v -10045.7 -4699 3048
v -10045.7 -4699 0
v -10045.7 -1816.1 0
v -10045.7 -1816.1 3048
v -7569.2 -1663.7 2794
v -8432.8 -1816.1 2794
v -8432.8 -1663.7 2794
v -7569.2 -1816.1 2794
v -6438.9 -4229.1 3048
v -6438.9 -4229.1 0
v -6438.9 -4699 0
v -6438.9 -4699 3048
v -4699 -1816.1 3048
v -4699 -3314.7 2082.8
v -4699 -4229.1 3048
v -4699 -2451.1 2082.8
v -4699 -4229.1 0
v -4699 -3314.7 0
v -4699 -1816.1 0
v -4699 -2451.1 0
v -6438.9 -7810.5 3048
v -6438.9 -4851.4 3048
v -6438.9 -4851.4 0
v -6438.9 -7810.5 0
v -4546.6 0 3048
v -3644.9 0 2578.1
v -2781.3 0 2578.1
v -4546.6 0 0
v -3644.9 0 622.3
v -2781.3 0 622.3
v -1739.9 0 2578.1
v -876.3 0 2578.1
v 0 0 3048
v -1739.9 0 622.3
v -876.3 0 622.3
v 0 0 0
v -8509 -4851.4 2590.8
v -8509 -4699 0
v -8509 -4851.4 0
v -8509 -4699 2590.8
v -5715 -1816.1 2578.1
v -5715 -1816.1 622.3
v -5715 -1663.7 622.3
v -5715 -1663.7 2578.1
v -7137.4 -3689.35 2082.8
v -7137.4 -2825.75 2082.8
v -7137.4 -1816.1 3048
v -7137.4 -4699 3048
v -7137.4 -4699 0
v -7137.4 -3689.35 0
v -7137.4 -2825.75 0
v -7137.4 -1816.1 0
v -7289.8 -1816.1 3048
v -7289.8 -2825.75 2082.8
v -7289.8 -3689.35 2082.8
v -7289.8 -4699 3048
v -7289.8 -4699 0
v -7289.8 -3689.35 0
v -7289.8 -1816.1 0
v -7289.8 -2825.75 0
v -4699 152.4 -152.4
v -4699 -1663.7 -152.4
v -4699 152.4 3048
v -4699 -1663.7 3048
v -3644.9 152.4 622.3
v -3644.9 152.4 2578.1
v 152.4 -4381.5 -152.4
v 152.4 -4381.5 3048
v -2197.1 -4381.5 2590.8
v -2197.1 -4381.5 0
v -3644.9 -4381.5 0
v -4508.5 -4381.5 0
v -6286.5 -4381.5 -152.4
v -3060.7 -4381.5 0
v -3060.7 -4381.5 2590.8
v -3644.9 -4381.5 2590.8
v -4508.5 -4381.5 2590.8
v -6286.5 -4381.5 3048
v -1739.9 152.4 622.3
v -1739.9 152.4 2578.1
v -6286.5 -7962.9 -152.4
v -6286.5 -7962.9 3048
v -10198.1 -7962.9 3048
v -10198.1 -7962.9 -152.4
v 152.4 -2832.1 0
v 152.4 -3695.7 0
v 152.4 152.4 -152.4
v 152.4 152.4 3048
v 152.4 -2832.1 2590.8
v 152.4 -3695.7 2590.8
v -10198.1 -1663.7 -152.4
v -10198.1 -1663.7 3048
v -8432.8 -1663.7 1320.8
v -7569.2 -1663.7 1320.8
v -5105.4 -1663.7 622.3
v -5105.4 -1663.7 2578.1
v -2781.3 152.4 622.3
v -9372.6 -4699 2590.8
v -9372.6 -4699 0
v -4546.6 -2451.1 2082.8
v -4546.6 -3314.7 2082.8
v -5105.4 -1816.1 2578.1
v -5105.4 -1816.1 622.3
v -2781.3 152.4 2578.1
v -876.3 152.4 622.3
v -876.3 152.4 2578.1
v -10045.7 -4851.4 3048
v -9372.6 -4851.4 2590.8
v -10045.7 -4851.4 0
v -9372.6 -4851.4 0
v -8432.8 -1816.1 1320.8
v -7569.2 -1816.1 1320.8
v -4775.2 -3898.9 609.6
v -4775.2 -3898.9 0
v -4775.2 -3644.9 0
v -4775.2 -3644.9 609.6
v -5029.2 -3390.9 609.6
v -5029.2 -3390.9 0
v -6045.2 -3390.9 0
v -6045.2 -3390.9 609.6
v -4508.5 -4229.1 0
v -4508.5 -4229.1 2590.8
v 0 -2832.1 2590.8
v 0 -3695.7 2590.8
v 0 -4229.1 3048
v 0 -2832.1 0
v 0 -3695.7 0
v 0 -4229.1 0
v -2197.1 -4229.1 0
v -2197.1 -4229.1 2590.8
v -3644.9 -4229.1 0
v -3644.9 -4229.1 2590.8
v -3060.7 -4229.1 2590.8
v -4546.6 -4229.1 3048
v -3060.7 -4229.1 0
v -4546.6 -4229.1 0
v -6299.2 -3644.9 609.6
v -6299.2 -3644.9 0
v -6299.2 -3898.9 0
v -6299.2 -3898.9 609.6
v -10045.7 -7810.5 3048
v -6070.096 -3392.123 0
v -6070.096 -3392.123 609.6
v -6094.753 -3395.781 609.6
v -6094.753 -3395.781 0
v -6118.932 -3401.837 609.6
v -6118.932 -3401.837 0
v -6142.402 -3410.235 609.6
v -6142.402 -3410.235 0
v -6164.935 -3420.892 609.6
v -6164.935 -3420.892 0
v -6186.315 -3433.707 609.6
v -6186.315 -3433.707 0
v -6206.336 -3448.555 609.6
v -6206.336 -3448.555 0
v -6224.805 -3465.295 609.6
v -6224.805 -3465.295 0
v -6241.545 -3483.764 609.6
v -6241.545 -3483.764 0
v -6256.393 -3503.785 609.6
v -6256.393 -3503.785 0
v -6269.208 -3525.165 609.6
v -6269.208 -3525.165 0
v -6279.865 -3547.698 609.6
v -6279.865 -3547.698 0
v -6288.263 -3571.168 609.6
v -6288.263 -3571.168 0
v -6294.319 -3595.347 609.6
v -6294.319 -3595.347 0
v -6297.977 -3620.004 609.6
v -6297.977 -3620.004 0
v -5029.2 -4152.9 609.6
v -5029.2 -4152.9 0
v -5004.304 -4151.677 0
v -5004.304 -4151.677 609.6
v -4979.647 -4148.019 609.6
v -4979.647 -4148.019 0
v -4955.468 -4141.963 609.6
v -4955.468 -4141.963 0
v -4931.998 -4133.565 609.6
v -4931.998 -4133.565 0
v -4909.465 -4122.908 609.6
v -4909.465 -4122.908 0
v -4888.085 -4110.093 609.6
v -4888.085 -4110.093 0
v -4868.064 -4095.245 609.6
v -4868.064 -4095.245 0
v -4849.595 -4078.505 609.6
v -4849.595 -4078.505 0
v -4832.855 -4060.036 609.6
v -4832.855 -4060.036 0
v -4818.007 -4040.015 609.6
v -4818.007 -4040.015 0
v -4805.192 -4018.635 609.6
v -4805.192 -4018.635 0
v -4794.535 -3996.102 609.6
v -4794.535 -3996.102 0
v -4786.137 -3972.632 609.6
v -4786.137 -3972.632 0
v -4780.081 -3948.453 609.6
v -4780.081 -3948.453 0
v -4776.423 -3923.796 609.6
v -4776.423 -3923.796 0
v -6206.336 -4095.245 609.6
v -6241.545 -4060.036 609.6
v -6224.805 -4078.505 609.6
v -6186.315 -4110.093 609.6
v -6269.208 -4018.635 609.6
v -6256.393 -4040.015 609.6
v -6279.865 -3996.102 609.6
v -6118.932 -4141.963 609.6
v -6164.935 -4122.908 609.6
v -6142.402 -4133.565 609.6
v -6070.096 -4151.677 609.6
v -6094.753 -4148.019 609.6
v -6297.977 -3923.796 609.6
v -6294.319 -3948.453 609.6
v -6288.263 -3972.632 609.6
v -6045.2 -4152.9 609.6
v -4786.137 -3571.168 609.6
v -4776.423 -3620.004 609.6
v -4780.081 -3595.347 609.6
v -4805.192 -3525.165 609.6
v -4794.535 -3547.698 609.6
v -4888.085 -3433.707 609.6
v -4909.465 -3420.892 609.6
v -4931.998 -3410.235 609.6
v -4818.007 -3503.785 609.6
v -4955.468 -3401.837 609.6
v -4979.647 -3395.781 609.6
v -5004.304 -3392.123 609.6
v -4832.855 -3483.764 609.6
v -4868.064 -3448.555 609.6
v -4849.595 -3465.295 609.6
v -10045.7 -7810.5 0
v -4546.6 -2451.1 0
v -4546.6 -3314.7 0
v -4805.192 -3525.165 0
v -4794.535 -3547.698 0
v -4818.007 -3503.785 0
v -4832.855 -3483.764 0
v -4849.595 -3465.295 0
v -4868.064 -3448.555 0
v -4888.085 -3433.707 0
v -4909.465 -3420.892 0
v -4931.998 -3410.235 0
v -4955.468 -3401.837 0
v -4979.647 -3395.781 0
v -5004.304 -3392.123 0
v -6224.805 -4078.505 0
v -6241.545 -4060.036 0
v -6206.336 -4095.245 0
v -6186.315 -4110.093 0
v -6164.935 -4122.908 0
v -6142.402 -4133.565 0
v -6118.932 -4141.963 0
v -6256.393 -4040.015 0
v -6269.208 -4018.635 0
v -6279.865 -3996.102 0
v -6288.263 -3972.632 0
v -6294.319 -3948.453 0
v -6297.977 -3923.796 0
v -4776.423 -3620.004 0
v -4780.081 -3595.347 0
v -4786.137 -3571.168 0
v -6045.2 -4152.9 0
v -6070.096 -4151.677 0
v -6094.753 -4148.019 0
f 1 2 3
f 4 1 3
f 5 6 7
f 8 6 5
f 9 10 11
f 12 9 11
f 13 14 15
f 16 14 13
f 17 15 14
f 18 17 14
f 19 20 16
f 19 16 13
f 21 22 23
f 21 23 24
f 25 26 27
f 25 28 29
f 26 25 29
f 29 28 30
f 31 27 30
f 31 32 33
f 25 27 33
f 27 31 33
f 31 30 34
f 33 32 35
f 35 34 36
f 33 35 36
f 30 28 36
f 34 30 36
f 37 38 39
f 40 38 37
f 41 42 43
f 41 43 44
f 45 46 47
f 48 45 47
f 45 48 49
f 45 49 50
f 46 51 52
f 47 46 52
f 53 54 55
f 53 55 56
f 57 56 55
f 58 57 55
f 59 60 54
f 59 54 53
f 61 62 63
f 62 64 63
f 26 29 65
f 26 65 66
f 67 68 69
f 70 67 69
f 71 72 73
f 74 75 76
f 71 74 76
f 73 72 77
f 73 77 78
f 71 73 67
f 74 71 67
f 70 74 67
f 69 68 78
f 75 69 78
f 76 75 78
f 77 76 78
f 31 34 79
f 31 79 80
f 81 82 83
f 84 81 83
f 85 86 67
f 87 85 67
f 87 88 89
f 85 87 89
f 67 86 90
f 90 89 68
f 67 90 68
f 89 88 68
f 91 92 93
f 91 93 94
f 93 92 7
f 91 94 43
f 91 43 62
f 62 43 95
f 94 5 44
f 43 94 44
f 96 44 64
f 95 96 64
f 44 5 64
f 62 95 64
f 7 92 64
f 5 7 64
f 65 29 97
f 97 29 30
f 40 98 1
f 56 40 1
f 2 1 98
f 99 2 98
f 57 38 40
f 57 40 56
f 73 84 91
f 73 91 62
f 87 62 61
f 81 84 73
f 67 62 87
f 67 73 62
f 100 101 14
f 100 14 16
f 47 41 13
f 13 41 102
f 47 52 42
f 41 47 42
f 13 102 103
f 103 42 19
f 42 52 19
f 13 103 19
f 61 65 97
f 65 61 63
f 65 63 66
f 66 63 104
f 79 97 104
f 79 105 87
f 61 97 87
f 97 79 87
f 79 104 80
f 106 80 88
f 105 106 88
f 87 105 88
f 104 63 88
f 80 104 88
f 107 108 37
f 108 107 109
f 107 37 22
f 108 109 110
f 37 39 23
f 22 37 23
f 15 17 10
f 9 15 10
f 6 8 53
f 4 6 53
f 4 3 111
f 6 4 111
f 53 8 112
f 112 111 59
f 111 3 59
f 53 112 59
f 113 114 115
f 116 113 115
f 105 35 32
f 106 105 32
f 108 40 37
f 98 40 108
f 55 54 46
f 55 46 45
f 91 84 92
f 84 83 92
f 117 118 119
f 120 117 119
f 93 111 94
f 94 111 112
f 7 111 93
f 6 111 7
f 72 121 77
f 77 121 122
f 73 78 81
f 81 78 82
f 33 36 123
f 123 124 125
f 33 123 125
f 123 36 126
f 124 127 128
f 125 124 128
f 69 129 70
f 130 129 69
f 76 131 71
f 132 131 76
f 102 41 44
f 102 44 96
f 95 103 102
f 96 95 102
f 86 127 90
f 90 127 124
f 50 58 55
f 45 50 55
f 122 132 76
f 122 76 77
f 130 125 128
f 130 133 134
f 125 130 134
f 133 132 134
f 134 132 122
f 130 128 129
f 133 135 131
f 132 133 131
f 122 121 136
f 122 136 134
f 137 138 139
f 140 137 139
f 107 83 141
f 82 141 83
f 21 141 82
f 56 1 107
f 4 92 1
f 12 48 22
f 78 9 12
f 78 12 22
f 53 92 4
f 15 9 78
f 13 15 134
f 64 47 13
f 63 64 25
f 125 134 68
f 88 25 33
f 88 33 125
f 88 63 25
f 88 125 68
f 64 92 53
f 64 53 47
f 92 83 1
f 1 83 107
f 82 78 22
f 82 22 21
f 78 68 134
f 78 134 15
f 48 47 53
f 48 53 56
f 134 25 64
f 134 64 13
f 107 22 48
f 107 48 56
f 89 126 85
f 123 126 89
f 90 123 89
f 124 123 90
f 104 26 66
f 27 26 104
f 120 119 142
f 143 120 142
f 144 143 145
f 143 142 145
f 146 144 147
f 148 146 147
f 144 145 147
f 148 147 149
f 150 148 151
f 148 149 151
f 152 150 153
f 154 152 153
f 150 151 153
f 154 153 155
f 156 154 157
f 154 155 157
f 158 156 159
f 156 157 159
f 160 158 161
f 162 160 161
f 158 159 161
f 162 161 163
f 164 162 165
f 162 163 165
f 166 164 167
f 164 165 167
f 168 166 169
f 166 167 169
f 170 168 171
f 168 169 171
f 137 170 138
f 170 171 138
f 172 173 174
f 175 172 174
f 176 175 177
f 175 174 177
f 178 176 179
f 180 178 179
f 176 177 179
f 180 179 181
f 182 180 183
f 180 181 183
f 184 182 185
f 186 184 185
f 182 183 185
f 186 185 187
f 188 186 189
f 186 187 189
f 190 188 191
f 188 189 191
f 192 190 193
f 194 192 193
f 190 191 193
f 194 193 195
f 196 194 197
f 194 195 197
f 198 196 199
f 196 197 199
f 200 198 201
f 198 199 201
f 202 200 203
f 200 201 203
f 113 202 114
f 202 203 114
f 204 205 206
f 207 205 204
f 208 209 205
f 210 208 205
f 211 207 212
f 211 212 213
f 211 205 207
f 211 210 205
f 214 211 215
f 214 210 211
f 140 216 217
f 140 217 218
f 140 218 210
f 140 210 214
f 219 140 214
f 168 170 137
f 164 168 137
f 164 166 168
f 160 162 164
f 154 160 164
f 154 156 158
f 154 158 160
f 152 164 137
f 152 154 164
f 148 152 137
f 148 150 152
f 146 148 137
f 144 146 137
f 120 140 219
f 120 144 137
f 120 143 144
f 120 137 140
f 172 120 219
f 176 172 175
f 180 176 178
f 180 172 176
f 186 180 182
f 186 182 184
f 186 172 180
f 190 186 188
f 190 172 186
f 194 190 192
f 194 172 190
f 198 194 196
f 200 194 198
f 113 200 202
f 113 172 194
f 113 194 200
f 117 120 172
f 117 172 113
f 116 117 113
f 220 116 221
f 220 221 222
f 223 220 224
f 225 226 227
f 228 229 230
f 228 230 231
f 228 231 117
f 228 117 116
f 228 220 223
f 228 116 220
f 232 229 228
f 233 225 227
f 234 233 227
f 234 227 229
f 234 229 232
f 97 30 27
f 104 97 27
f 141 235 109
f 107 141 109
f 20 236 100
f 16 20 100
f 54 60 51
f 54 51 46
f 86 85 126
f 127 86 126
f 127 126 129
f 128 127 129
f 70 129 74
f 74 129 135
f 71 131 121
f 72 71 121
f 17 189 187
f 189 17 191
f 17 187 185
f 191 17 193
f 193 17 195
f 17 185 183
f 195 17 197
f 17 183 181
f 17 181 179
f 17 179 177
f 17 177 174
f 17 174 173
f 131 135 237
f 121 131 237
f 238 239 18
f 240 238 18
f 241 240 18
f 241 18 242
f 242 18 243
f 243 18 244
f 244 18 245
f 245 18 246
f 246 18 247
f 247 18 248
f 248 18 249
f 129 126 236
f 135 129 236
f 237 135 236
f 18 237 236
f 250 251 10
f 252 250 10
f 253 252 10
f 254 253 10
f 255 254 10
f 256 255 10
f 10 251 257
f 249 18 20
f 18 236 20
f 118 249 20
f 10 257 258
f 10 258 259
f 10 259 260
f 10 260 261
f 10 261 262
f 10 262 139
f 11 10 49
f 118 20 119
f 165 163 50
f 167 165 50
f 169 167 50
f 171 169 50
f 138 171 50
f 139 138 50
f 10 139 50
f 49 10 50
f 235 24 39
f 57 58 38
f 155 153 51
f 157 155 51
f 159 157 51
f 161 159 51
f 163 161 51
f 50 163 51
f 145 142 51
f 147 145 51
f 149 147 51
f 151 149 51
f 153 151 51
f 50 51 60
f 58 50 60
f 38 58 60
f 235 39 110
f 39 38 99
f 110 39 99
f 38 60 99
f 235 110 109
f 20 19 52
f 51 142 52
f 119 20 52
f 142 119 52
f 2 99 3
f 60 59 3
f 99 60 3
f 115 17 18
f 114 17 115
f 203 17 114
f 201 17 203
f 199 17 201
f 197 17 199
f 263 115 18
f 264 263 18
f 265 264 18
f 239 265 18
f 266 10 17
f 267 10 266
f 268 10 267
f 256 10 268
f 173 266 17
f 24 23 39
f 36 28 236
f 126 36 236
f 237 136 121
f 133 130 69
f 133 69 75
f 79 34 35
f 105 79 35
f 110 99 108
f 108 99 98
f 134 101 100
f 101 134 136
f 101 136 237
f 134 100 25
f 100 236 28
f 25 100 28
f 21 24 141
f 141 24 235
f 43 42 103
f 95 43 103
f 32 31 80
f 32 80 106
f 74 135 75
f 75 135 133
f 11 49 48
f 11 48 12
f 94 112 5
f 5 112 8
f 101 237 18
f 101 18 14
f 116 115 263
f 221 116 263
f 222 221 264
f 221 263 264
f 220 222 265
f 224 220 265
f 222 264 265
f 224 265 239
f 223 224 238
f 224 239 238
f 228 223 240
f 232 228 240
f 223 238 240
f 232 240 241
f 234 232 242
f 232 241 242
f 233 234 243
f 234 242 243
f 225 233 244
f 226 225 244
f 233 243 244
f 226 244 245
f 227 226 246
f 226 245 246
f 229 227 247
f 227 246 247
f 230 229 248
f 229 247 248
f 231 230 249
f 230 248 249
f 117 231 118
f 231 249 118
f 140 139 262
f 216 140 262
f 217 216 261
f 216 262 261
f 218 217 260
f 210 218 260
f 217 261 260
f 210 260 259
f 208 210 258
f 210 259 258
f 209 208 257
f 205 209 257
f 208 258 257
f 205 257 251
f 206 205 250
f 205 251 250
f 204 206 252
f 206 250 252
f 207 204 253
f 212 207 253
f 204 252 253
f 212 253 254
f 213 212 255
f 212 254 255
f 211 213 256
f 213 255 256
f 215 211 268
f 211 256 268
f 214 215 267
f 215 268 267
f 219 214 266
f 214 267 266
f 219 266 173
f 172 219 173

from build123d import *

# Parameters (mm, degrees)
F1_DEPTH  = 3048
F3_DEPTH  = 152.4
F4_W      = 863.6
F4_H      = 2590.8
F5_DEPTH  = 3733.801
F6_W      = 863.6
F6_H      = 1955.8
F7_DEPTH  = 152.401
F8_W      = 863.6
F8_H      = 2590.8
F9_DEPTH  = 152.401
F10_W     = 152.4
F10_H     = 2413
F10_W_2   = 3606.8
F10_H_2   = 152.4
F11_DEPTH = 3048
F12_W     = 609.6
F12_H     = 1955.8
F12_W_2   = 863.6
F12_H_2   = 1473.2
F13_DEPTH = 1968.501
F14_W     = 152.4
F14_H     = 2882.9
F15_DEPTH = 3048
F16_W     = 863.6
F16_H     = 2082.8
F17_DEPTH = 152.4
F18_W     = 863.6
F18_H     = 2590.8
F19_DEPTH = 152.4
F20_W     = 863.6
F20_H     = 2082.8
F21_DEPTH = 152.4
F23_DEPTH = 609.6


with BuildPart() as f1:
    # F0 (on Top) → F1 (new body)
    with BuildSketch(Plane.XY):
        Polygon((152.4, 152.4), (-4699, 152.4), (-4699, -1663.7), (-10198.1, -1663.7), (-10198.1, -7962.9), (-6286.5, -7962.9), (-6286.5, -4381.5), (152.4, -4381.5), align=None)
        Polygon((-4546.6, 0), (0, 0), (0, -4229.1), (-6438.9, -4229.1), (-6438.9, -7810.5), (-10045.7, -7810.5), (-10045.7, -1816.1), (-4546.6, -1816.1), align=None, mode=Mode.SUBTRACT)
    extrude(amount=F1_DEPTH)

    # F2 (on face) → F3 (join)
    with BuildSketch(Plane(origin=(0, 0, 0), x_dir=(1, 0, 0), z_dir=(0, 0, -1))):
        Polygon((-6286.5, 7962.9), (-10198.1, 7962.9), (-10198.1, 1663.7), (-4699, 1663.7), (-4699, -152.4), (152.4, -152.4), (152.4, 4381.5), (-6286.5, 4381.5), align=None)
    extrude(amount=F3_DEPTH)

    # F4 (on face) → F5 (cut, through all)
    with BuildSketch(Plane(origin=(0, -4229.1, 0), x_dir=(-1, 0, 0), z_dir=(0, 1, 0))):
        with Locations((2628.9, 1295.4)):
            Rectangle(F4_W, F4_H)
        with Locations((4076.7, 1295.4)):
            Rectangle(F4_W, F4_H)
    extrude(amount=-F5_DEPTH, mode=Mode.SUBTRACT)

    # F6 (on face) → F7 (cut, through all)
    with BuildSketch(Plane.XZ):
        with Locations((-3213.1, 1600.2)):
            Rectangle(F6_W, F6_H)
        with Locations((-1308.1, 1600.2)):
            Rectangle(F6_W, F6_H)
    extrude(amount=-F7_DEPTH, mode=Mode.SUBTRACT)

    # F8 (on face) → F9 (cut, through all)
    with BuildSketch(Plane(origin=(0, 0, 0), x_dir=(0, -1, 0), z_dir=(-1, 0, 0))):
        with Locations((3263.9, 1295.4)):
            Rectangle(F8_W, F8_H)
    extrude(amount=-F9_DEPTH, mode=Mode.SUBTRACT)

    # F10 (on face) → F11 (join, through all)
    with BuildSketch(Plane.XY):
        with Locations((-4622.8, -3022.6)):
            Rectangle(F10_W, F10_H)
        with Locations((-8242.3, -4775.2)):
            Rectangle(F10_W_2, F10_H_2)
    extrude(amount=F11_DEPTH)

    # F12 (on face) → F13 (cut, through all)
    with BuildSketch(Plane.XZ.offset(1816.1)):
        with Locations((-5410.2, 1600.2)):
            Rectangle(F12_W, F12_H)
        with Locations((-8001, 2057.4)):
            Rectangle(F12_W_2, F12_H_2)
    extrude(amount=-F13_DEPTH, mode=Mode.SUBTRACT)

    # F14 (on face) → F15 (join, through all)
    with BuildSketch(Plane.XY):
        with Locations((-7213.6, -3257.55)):
            Rectangle(F14_W, F14_H)
    extrude(amount=F15_DEPTH)

    # F16 (on face) → F17 (cut, through all)
    with BuildSketch(Plane.YZ.offset(-4546.6)):
        with Locations((-2882.9, 1041.4)):
            Rectangle(F16_W, F16_H)
    extrude(amount=-F17_DEPTH, mode=Mode.SUBTRACT)

    # F18 (on face) → F19 (cut, through all)
    with BuildSketch(Plane(origin=(0, -4699, 0), x_dir=(-1, 0, 0), z_dir=(0, 1, 0))):
        with Locations((8940.8, 1295.4)):
            Rectangle(F18_W, F18_H)
    extrude(amount=-F19_DEPTH, mode=Mode.SUBTRACT)

    # F20 (on face) → F21 (cut, through all)
    with BuildSketch(Plane(origin=(-7289.8, 0, 0), x_dir=(0, -1, 0), z_dir=(-1, 0, 0))):
        with Locations((3257.55, 1041.4)):
            Rectangle(F20_W, F20_H)
    extrude(amount=-F21_DEPTH, mode=Mode.SUBTRACT)

    # F22 (on face) → F23 (join)
    with BuildSketch(Plane.XY):
        with BuildLine():
            ThreePointArc((-6299.2, -3898.9), (-6224.8051224214, -4078.5051224214), (-6045.2, -4152.9))
            Line((-6045.2, -4152.9), (-5029.2, -4152.9))
            ThreePointArc((-5029.2, -4152.9), (-4849.5948775786, -4078.5051224214), (-4775.2, -3898.9))
            Line((-4775.2, -3898.9), (-4775.2, -3644.9))
            ThreePointArc((-4775.2, -3644.9), (-4849.5948775786, -3465.2948775786), (-5029.2, -3390.9))
            Line((-5029.2, -3390.9), (-6045.2, -3390.9))
            ThreePointArc((-6045.2, -3390.9), (-6224.8051224214, -3465.2948775786), (-6299.2, -3644.9))
            Line((-6299.2, -3644.9), (-6299.2, -3898.9))
        make_face()
    extrude(amount=F23_DEPTH)


solid = f1.part
